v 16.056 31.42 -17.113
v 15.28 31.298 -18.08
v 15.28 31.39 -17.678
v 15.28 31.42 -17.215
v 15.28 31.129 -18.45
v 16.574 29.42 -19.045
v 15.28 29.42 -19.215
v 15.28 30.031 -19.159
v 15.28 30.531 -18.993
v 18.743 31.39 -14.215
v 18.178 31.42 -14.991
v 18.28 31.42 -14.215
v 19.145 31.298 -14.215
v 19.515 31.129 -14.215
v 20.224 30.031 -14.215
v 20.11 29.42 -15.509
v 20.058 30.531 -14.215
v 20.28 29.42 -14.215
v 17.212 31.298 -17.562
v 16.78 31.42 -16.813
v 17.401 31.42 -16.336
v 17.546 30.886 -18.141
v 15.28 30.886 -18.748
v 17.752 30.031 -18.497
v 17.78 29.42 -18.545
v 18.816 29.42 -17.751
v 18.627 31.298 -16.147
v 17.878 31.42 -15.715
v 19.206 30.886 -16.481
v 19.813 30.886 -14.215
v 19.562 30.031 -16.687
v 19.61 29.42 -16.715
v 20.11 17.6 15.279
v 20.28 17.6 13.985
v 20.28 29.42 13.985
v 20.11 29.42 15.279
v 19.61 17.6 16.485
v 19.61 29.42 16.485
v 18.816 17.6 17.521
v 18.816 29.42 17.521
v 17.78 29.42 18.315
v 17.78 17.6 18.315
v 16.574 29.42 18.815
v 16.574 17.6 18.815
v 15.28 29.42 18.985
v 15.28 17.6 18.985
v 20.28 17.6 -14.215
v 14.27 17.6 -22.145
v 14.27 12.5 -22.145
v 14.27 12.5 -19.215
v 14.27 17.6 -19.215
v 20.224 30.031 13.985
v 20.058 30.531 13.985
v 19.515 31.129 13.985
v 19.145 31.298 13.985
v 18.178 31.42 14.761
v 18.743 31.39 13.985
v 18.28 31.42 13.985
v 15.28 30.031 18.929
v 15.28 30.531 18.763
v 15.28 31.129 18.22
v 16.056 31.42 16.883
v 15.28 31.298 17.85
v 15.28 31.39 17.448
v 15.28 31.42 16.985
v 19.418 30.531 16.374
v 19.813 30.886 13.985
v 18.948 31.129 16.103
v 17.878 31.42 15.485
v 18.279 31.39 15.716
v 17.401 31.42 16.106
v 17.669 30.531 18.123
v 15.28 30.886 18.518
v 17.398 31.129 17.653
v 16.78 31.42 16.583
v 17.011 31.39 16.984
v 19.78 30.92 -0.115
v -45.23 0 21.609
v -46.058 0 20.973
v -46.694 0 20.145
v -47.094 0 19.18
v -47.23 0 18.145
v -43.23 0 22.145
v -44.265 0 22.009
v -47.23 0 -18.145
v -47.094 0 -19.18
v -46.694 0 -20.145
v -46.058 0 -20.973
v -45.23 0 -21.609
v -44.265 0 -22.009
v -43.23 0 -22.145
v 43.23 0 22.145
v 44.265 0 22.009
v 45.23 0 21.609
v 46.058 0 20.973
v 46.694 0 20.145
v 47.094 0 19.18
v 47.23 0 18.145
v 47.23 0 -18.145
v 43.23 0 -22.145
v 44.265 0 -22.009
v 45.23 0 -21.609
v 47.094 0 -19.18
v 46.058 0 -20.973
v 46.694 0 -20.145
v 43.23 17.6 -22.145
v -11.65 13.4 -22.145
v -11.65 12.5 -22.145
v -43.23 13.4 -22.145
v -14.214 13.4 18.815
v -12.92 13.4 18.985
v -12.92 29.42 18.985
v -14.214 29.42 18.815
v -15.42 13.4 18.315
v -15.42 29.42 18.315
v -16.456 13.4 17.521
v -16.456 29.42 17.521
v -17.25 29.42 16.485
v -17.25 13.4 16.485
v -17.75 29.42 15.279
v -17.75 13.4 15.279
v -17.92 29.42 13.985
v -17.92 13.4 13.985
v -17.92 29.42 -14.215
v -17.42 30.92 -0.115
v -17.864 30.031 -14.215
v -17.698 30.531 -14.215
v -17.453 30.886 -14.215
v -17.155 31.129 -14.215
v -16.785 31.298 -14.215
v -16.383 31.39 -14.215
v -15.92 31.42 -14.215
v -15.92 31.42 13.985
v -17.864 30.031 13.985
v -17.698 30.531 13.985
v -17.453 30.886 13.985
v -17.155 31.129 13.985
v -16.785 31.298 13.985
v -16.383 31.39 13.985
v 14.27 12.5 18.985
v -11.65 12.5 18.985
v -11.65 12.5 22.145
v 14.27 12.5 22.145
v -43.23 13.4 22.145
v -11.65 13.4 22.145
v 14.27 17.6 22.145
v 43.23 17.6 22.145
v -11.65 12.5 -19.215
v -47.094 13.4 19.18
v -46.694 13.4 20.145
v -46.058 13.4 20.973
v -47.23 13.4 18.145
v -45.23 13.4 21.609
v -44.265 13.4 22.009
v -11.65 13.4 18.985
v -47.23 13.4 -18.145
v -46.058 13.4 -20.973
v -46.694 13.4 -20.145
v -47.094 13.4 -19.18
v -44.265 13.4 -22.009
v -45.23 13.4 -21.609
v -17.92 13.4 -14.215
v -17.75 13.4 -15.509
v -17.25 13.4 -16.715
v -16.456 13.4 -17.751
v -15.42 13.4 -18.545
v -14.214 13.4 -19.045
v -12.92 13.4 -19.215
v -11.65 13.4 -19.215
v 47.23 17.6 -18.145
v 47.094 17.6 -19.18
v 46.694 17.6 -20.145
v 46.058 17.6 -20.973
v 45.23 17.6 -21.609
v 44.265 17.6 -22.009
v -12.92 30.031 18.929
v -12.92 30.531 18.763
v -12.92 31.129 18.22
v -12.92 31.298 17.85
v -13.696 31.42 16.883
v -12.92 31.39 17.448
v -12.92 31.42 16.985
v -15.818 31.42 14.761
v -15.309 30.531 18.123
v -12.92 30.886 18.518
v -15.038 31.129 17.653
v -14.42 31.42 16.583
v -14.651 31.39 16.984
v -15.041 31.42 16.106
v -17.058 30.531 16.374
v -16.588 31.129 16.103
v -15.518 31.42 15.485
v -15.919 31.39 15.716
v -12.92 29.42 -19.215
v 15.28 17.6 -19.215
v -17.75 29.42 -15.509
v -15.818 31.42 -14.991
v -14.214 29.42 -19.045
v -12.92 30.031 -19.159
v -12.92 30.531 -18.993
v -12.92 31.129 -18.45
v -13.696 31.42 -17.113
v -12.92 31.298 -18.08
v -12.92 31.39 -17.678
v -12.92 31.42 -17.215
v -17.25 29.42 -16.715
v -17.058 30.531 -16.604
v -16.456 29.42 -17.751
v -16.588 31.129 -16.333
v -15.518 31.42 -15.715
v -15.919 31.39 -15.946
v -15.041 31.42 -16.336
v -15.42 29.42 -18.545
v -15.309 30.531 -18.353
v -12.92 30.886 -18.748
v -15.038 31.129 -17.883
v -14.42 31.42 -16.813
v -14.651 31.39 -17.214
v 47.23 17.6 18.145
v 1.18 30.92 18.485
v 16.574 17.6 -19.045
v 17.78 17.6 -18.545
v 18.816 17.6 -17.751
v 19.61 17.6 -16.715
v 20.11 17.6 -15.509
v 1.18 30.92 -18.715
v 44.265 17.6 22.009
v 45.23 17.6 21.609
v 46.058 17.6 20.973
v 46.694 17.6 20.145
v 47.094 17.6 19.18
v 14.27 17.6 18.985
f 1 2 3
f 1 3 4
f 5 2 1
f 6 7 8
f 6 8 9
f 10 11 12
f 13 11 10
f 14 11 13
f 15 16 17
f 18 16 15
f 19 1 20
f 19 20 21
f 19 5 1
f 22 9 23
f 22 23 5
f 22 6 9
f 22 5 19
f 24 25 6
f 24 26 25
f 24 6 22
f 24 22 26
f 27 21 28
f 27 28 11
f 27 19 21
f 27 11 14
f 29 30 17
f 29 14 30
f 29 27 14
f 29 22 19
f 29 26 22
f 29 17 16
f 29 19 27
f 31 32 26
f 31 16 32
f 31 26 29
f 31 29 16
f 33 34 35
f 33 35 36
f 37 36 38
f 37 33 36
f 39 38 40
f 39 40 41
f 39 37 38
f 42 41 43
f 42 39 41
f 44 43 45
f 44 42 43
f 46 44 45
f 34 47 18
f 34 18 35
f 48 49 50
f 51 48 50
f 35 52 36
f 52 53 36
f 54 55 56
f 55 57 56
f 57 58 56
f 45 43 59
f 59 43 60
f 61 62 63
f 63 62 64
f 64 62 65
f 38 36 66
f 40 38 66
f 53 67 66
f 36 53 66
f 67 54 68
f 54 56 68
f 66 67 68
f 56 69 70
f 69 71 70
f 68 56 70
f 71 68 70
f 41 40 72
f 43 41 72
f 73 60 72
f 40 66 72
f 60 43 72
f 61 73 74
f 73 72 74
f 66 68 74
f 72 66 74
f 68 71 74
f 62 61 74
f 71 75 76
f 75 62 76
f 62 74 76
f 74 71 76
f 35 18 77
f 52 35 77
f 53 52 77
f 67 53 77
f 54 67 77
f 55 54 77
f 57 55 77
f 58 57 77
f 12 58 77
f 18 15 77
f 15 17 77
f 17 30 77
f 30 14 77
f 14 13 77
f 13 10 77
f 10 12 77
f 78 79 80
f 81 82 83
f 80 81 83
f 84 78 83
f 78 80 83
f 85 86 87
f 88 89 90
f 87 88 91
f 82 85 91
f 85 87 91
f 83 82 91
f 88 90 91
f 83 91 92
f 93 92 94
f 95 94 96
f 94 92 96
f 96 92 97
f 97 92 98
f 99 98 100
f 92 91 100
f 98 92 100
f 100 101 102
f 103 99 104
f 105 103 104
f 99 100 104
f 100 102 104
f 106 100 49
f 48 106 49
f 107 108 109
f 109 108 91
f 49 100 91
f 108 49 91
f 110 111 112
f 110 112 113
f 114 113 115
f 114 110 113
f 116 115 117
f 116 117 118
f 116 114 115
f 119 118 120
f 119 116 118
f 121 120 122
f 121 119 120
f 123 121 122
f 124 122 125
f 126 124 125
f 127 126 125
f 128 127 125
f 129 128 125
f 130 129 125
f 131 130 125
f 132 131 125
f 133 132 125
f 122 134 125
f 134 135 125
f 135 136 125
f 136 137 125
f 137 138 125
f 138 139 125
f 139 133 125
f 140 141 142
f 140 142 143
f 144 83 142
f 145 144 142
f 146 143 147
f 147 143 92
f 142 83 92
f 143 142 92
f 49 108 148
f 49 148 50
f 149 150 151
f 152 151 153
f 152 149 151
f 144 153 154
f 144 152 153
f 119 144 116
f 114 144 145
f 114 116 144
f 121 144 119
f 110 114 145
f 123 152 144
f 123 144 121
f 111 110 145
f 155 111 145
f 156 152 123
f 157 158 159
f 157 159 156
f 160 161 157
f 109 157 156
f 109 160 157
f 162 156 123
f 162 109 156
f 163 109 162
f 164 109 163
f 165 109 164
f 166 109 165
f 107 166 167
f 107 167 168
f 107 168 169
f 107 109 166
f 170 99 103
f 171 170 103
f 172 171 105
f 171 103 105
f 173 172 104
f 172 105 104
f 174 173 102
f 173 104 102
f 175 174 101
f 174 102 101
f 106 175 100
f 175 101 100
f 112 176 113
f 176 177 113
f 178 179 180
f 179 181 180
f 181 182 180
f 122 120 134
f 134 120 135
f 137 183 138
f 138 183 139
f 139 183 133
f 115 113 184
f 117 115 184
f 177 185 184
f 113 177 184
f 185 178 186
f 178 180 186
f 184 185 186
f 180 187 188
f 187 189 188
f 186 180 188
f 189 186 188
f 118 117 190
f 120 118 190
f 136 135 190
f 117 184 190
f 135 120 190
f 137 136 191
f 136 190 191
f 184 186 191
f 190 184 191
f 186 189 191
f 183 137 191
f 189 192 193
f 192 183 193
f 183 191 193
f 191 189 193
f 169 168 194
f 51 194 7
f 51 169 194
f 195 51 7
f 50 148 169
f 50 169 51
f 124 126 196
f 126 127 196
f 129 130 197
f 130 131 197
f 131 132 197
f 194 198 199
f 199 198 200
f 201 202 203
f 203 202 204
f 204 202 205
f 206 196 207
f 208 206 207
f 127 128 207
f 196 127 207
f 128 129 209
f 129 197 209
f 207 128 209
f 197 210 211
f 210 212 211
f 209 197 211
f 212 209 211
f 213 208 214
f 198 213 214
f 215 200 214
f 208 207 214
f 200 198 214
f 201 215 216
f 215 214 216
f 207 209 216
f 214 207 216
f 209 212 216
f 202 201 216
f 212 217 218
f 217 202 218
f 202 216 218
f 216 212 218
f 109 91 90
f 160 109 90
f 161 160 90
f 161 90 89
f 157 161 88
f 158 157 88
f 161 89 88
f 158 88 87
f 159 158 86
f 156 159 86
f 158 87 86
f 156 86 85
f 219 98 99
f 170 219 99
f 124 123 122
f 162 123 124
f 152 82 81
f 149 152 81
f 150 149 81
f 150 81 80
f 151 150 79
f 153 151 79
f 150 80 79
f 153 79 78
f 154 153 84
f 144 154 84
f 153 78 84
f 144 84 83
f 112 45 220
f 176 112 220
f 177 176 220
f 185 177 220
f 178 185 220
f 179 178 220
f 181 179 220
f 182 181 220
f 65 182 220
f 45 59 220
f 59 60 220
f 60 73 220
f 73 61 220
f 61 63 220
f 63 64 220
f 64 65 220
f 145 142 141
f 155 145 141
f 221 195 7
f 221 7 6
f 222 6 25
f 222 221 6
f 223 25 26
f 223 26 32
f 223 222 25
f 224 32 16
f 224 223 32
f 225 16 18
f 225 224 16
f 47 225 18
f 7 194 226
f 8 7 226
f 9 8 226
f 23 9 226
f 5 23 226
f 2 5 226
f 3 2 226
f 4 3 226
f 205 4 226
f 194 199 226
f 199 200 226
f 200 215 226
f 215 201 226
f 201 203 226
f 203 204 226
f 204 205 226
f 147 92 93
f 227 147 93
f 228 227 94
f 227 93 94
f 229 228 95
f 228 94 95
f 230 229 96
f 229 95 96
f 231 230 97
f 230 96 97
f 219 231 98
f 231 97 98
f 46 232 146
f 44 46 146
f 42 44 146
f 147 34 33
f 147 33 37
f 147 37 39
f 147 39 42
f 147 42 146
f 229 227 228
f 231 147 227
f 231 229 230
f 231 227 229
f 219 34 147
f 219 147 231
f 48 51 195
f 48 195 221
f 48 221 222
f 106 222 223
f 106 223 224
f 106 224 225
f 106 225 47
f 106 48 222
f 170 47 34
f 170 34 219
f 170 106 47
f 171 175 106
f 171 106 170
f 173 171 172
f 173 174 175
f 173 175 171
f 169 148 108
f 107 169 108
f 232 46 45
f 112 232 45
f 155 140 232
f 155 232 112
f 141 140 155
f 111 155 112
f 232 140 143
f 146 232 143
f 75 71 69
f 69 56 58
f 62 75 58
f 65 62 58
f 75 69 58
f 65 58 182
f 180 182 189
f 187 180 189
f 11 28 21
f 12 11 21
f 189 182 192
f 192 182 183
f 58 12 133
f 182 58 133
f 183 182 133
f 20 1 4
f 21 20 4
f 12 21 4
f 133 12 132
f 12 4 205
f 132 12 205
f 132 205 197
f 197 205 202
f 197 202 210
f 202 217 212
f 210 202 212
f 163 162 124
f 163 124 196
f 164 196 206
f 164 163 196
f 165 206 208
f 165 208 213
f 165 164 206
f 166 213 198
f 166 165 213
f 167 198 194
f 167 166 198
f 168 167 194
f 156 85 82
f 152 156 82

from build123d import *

# Parameters (mm, degrees)
BOSS_EXTRUDE1_DEPTH = 31.42
BOSS_EXTRUDE2_DEPTH = 13.4
BOSS_EXTRUDE3_DEPTH = 17.6
SKETCH1_5_W         = 25.92
SKETCH1_5_H         = 3.16
SKETCH1_5_H_2       = 2.93
BOSS_EXTRUDE4_DEPTH = 12.5
FILLET2_SIZE        = 2


with BuildPart() as part:
    # Sketch1 → Boss-Extrude1 (new body)
    with BuildSketch(Plane(origin=(0, 0, 0), x_dir=(1, 0, 0), z_dir=(0, 1, 0))):
        with BuildLine():
            Line((-12.92, 19.215), (15.28, 19.215))
            ThreePointArc((15.28, 19.215), (18.815533906, 17.750533906), (20.28, 14.215))
            Line((20.28, 14.215), (20.28, -13.985))
            ThreePointArc((20.28, -13.985), (18.815533906, -17.520533906), (15.28, -18.985))
            Line((15.28, -18.985), (-12.92, -18.985))
            ThreePointArc((-12.92, -18.985), (-16.455533906, -17.520533906), (-17.92, -13.985))
            Line((-17.92, -13.985), (-17.92, 14.215))
            ThreePointArc((-17.92, 14.215), (-16.455533906, 17.750533906), (-12.92, 19.215))
        make_face()
    extrude(amount=BOSS_EXTRUDE1_DEPTH)

    # Sketch1<3> → Boss-Extrude2 (add)
    with BuildSketch(Plane(origin=(0, 0, 0), x_dir=(1, 0, 0), z_dir=(0, 1, 0))):
        with BuildLine():
            Line((-43.23, -22.145), (-11.65, -22.145))
            Line((-11.65, -22.145), (-11.65, -18.985))
            Line((-11.65, -18.985), (-12.92, -18.985))
            ThreePointArc((-12.92, -18.985), (-16.455533906, -17.520533906), (-17.92, -13.985))
            Line((-17.92, -13.985), (-17.92, 14.215))
            ThreePointArc((-17.92, 14.215), (-16.455533906, 17.750533906), (-12.92, 19.215))
            Line((-12.92, 19.215), (-11.65, 19.215))
            Line((-11.65, 19.215), (-11.65, 22.145))
            Line((-11.65, 22.145), (-43.23, 22.145))
            ThreePointArc((-43.23, 22.145), (-46.058427125, 20.973427125), (-47.23, 18.145))
            Line((-47.23, 18.145), (-47.23, -18.145))
            ThreePointArc((-47.23, -18.145), (-46.058427125, -20.973427125), (-43.23, -22.145))
        make_face()
    extrude(amount=BOSS_EXTRUDE2_DEPTH)

    # Sketch1<4> → Boss-Extrude3 (add)
    with BuildSketch(Plane(origin=(0, 0, 0), x_dir=(1, 0, 0), z_dir=(0, 1, 0))):
        with BuildLine():
            Line((14.27, -18.985), (14.27, -22.145))
            Line((14.27, -22.145), (43.23, -22.145))
            ThreePointArc((43.23, -22.145), (46.058427125, -20.973427125), (47.23, -18.145))
            Line((47.23, -18.145), (47.23, 18.145))
            ThreePointArc((47.23, 18.145), (46.058427125, 20.973427125), (43.23, 22.145))
            Line((43.23, 22.145), (14.27, 22.145))
            Line((14.27, 22.145), (14.27, 19.215))
            Line((14.27, 19.215), (15.28, 19.215))
            ThreePointArc((15.28, 19.215), (18.815533906, 17.750533906), (20.28, 14.215))
            Line((20.28, 14.215), (20.28, -13.985))
            ThreePointArc((20.28, -13.985), (18.815533906, -17.520533906), (15.28, -18.985))
            Line((15.28, -18.985), (14.27, -18.985))
        make_face()
    extrude(amount=BOSS_EXTRUDE3_DEPTH)

    # Sketch1<5> → Boss-Extrude4 (add)
    with BuildSketch(Plane(origin=(0, 0, 0), x_dir=(1, 0, 0), z_dir=(0, 1, 0))):
        with Locations((1.31, -20.565)):
            Rectangle(SKETCH1_5_W, SKETCH1_5_H)
        with Locations((1.31, 20.68)):
            Rectangle(SKETCH1_5_W, SKETCH1_5_H_2)
    extrude(amount=BOSS_EXTRUDE4_DEPTH)

    # Fillet2
    # a fillet whose section is not a circle: 2 mm, written as the material it takes off along each edge
    with BuildSketch(Plane(origin=(-17.92, 31.42, 13.985), x_dir=(0, -1, 0), z_dir=(0, 0, -1)), Plane(origin=(-12.92, 31.42, -19.215), x_dir=(0, -1, 0), z_dir=(1, 0, 0)), Plane(origin=(20.28, 31.42, -14.215), x_dir=(0, -1, 0), z_dir=(0, 0, 1)), Plane(origin=(15.28, 31.42, 18.985), x_dir=(0, -1, 0), z_dir=(-1, 0, 0))) as fillet2_piece_1:
        with BuildLine():
            Bezier((FILLET2_SIZE, 0), (0, 0), (0, -FILLET2_SIZE), weights=[1, 1, 1])
            Line((0, -FILLET2_SIZE), (0, 0))
            Line((0, 0), (FILLET2_SIZE, 0))
        make_face()
    extrude(amount=28.2, mode=Mode.SUBTRACT)
    with BuildSketch(Plane(origin=(-12.92, 31.42, -14.215), x_dir=(-1, 0, 0), z_dir=(0, 0, 1))) as fillet2_piece_2:
        with BuildLine():
            Bezier((5, FILLET2_SIZE), (5, 0), (5 - FILLET2_SIZE, 0), weights=[1, 1, 1])
            Line((5 - FILLET2_SIZE, 0), (5, 0))
            Line((5, 0), (5, FILLET2_SIZE))
        make_face()
    revolve(axis=Axis((-12.92, 31.42, -14.215), (0, -1, 0)), revolution_arc=90, mode=Mode.SUBTRACT)
    with BuildSketch(Plane(origin=(15.28, 31.42, -14.215), x_dir=(0, 0, -1), z_dir=(-1, 0, 0))) as fillet2_piece_3:
        with BuildLine():
            Bezier((5 - FILLET2_SIZE, 0), (5, 0), (5, FILLET2_SIZE), weights=[1, 1, 1])
            Line((5, FILLET2_SIZE), (5, 0))
            Line((5, 0), (5 - FILLET2_SIZE, 0))
        make_face()
    revolve(axis=Axis((15.28, 31.42, -14.215), (0, -1, 0)), revolution_arc=90, mode=Mode.SUBTRACT)
    with BuildSketch(Plane(origin=(15.28, 31.42, 13.985), x_dir=(1, 0, 0), z_dir=(0, 0, -1))) as fillet2_piece_4:
        with BuildLine():
            Bezier((5, FILLET2_SIZE), (5, 0), (5 - FILLET2_SIZE, 0), weights=[1, 1, 1])
            Line((5 - FILLET2_SIZE, 0), (5, 0))
            Line((5, 0), (5, FILLET2_SIZE))
        make_face()
    revolve(axis=Axis((15.28, 31.42, 13.985), (0, -1, 0)), revolution_arc=90, mode=Mode.SUBTRACT)
    with BuildSketch(Plane(origin=(-12.92, 31.42, 13.985), x_dir=(0, 0, 1), z_dir=(1, 0, 0))) as fillet2_piece_5:
        with BuildLine():
            Bezier((5, FILLET2_SIZE), (5, 0), (5 - FILLET2_SIZE, 0), weights=[1, 1, 1])
            Line((5 - FILLET2_SIZE, 0), (5, 0))
            Line((5, 0), (5, FILLET2_SIZE))
        make_face()
    revolve(axis=Axis((-12.92, 31.42, 13.985), (0, -1, 0)), revolution_arc=90, mode=Mode.SUBTRACT)


solid = part.part
